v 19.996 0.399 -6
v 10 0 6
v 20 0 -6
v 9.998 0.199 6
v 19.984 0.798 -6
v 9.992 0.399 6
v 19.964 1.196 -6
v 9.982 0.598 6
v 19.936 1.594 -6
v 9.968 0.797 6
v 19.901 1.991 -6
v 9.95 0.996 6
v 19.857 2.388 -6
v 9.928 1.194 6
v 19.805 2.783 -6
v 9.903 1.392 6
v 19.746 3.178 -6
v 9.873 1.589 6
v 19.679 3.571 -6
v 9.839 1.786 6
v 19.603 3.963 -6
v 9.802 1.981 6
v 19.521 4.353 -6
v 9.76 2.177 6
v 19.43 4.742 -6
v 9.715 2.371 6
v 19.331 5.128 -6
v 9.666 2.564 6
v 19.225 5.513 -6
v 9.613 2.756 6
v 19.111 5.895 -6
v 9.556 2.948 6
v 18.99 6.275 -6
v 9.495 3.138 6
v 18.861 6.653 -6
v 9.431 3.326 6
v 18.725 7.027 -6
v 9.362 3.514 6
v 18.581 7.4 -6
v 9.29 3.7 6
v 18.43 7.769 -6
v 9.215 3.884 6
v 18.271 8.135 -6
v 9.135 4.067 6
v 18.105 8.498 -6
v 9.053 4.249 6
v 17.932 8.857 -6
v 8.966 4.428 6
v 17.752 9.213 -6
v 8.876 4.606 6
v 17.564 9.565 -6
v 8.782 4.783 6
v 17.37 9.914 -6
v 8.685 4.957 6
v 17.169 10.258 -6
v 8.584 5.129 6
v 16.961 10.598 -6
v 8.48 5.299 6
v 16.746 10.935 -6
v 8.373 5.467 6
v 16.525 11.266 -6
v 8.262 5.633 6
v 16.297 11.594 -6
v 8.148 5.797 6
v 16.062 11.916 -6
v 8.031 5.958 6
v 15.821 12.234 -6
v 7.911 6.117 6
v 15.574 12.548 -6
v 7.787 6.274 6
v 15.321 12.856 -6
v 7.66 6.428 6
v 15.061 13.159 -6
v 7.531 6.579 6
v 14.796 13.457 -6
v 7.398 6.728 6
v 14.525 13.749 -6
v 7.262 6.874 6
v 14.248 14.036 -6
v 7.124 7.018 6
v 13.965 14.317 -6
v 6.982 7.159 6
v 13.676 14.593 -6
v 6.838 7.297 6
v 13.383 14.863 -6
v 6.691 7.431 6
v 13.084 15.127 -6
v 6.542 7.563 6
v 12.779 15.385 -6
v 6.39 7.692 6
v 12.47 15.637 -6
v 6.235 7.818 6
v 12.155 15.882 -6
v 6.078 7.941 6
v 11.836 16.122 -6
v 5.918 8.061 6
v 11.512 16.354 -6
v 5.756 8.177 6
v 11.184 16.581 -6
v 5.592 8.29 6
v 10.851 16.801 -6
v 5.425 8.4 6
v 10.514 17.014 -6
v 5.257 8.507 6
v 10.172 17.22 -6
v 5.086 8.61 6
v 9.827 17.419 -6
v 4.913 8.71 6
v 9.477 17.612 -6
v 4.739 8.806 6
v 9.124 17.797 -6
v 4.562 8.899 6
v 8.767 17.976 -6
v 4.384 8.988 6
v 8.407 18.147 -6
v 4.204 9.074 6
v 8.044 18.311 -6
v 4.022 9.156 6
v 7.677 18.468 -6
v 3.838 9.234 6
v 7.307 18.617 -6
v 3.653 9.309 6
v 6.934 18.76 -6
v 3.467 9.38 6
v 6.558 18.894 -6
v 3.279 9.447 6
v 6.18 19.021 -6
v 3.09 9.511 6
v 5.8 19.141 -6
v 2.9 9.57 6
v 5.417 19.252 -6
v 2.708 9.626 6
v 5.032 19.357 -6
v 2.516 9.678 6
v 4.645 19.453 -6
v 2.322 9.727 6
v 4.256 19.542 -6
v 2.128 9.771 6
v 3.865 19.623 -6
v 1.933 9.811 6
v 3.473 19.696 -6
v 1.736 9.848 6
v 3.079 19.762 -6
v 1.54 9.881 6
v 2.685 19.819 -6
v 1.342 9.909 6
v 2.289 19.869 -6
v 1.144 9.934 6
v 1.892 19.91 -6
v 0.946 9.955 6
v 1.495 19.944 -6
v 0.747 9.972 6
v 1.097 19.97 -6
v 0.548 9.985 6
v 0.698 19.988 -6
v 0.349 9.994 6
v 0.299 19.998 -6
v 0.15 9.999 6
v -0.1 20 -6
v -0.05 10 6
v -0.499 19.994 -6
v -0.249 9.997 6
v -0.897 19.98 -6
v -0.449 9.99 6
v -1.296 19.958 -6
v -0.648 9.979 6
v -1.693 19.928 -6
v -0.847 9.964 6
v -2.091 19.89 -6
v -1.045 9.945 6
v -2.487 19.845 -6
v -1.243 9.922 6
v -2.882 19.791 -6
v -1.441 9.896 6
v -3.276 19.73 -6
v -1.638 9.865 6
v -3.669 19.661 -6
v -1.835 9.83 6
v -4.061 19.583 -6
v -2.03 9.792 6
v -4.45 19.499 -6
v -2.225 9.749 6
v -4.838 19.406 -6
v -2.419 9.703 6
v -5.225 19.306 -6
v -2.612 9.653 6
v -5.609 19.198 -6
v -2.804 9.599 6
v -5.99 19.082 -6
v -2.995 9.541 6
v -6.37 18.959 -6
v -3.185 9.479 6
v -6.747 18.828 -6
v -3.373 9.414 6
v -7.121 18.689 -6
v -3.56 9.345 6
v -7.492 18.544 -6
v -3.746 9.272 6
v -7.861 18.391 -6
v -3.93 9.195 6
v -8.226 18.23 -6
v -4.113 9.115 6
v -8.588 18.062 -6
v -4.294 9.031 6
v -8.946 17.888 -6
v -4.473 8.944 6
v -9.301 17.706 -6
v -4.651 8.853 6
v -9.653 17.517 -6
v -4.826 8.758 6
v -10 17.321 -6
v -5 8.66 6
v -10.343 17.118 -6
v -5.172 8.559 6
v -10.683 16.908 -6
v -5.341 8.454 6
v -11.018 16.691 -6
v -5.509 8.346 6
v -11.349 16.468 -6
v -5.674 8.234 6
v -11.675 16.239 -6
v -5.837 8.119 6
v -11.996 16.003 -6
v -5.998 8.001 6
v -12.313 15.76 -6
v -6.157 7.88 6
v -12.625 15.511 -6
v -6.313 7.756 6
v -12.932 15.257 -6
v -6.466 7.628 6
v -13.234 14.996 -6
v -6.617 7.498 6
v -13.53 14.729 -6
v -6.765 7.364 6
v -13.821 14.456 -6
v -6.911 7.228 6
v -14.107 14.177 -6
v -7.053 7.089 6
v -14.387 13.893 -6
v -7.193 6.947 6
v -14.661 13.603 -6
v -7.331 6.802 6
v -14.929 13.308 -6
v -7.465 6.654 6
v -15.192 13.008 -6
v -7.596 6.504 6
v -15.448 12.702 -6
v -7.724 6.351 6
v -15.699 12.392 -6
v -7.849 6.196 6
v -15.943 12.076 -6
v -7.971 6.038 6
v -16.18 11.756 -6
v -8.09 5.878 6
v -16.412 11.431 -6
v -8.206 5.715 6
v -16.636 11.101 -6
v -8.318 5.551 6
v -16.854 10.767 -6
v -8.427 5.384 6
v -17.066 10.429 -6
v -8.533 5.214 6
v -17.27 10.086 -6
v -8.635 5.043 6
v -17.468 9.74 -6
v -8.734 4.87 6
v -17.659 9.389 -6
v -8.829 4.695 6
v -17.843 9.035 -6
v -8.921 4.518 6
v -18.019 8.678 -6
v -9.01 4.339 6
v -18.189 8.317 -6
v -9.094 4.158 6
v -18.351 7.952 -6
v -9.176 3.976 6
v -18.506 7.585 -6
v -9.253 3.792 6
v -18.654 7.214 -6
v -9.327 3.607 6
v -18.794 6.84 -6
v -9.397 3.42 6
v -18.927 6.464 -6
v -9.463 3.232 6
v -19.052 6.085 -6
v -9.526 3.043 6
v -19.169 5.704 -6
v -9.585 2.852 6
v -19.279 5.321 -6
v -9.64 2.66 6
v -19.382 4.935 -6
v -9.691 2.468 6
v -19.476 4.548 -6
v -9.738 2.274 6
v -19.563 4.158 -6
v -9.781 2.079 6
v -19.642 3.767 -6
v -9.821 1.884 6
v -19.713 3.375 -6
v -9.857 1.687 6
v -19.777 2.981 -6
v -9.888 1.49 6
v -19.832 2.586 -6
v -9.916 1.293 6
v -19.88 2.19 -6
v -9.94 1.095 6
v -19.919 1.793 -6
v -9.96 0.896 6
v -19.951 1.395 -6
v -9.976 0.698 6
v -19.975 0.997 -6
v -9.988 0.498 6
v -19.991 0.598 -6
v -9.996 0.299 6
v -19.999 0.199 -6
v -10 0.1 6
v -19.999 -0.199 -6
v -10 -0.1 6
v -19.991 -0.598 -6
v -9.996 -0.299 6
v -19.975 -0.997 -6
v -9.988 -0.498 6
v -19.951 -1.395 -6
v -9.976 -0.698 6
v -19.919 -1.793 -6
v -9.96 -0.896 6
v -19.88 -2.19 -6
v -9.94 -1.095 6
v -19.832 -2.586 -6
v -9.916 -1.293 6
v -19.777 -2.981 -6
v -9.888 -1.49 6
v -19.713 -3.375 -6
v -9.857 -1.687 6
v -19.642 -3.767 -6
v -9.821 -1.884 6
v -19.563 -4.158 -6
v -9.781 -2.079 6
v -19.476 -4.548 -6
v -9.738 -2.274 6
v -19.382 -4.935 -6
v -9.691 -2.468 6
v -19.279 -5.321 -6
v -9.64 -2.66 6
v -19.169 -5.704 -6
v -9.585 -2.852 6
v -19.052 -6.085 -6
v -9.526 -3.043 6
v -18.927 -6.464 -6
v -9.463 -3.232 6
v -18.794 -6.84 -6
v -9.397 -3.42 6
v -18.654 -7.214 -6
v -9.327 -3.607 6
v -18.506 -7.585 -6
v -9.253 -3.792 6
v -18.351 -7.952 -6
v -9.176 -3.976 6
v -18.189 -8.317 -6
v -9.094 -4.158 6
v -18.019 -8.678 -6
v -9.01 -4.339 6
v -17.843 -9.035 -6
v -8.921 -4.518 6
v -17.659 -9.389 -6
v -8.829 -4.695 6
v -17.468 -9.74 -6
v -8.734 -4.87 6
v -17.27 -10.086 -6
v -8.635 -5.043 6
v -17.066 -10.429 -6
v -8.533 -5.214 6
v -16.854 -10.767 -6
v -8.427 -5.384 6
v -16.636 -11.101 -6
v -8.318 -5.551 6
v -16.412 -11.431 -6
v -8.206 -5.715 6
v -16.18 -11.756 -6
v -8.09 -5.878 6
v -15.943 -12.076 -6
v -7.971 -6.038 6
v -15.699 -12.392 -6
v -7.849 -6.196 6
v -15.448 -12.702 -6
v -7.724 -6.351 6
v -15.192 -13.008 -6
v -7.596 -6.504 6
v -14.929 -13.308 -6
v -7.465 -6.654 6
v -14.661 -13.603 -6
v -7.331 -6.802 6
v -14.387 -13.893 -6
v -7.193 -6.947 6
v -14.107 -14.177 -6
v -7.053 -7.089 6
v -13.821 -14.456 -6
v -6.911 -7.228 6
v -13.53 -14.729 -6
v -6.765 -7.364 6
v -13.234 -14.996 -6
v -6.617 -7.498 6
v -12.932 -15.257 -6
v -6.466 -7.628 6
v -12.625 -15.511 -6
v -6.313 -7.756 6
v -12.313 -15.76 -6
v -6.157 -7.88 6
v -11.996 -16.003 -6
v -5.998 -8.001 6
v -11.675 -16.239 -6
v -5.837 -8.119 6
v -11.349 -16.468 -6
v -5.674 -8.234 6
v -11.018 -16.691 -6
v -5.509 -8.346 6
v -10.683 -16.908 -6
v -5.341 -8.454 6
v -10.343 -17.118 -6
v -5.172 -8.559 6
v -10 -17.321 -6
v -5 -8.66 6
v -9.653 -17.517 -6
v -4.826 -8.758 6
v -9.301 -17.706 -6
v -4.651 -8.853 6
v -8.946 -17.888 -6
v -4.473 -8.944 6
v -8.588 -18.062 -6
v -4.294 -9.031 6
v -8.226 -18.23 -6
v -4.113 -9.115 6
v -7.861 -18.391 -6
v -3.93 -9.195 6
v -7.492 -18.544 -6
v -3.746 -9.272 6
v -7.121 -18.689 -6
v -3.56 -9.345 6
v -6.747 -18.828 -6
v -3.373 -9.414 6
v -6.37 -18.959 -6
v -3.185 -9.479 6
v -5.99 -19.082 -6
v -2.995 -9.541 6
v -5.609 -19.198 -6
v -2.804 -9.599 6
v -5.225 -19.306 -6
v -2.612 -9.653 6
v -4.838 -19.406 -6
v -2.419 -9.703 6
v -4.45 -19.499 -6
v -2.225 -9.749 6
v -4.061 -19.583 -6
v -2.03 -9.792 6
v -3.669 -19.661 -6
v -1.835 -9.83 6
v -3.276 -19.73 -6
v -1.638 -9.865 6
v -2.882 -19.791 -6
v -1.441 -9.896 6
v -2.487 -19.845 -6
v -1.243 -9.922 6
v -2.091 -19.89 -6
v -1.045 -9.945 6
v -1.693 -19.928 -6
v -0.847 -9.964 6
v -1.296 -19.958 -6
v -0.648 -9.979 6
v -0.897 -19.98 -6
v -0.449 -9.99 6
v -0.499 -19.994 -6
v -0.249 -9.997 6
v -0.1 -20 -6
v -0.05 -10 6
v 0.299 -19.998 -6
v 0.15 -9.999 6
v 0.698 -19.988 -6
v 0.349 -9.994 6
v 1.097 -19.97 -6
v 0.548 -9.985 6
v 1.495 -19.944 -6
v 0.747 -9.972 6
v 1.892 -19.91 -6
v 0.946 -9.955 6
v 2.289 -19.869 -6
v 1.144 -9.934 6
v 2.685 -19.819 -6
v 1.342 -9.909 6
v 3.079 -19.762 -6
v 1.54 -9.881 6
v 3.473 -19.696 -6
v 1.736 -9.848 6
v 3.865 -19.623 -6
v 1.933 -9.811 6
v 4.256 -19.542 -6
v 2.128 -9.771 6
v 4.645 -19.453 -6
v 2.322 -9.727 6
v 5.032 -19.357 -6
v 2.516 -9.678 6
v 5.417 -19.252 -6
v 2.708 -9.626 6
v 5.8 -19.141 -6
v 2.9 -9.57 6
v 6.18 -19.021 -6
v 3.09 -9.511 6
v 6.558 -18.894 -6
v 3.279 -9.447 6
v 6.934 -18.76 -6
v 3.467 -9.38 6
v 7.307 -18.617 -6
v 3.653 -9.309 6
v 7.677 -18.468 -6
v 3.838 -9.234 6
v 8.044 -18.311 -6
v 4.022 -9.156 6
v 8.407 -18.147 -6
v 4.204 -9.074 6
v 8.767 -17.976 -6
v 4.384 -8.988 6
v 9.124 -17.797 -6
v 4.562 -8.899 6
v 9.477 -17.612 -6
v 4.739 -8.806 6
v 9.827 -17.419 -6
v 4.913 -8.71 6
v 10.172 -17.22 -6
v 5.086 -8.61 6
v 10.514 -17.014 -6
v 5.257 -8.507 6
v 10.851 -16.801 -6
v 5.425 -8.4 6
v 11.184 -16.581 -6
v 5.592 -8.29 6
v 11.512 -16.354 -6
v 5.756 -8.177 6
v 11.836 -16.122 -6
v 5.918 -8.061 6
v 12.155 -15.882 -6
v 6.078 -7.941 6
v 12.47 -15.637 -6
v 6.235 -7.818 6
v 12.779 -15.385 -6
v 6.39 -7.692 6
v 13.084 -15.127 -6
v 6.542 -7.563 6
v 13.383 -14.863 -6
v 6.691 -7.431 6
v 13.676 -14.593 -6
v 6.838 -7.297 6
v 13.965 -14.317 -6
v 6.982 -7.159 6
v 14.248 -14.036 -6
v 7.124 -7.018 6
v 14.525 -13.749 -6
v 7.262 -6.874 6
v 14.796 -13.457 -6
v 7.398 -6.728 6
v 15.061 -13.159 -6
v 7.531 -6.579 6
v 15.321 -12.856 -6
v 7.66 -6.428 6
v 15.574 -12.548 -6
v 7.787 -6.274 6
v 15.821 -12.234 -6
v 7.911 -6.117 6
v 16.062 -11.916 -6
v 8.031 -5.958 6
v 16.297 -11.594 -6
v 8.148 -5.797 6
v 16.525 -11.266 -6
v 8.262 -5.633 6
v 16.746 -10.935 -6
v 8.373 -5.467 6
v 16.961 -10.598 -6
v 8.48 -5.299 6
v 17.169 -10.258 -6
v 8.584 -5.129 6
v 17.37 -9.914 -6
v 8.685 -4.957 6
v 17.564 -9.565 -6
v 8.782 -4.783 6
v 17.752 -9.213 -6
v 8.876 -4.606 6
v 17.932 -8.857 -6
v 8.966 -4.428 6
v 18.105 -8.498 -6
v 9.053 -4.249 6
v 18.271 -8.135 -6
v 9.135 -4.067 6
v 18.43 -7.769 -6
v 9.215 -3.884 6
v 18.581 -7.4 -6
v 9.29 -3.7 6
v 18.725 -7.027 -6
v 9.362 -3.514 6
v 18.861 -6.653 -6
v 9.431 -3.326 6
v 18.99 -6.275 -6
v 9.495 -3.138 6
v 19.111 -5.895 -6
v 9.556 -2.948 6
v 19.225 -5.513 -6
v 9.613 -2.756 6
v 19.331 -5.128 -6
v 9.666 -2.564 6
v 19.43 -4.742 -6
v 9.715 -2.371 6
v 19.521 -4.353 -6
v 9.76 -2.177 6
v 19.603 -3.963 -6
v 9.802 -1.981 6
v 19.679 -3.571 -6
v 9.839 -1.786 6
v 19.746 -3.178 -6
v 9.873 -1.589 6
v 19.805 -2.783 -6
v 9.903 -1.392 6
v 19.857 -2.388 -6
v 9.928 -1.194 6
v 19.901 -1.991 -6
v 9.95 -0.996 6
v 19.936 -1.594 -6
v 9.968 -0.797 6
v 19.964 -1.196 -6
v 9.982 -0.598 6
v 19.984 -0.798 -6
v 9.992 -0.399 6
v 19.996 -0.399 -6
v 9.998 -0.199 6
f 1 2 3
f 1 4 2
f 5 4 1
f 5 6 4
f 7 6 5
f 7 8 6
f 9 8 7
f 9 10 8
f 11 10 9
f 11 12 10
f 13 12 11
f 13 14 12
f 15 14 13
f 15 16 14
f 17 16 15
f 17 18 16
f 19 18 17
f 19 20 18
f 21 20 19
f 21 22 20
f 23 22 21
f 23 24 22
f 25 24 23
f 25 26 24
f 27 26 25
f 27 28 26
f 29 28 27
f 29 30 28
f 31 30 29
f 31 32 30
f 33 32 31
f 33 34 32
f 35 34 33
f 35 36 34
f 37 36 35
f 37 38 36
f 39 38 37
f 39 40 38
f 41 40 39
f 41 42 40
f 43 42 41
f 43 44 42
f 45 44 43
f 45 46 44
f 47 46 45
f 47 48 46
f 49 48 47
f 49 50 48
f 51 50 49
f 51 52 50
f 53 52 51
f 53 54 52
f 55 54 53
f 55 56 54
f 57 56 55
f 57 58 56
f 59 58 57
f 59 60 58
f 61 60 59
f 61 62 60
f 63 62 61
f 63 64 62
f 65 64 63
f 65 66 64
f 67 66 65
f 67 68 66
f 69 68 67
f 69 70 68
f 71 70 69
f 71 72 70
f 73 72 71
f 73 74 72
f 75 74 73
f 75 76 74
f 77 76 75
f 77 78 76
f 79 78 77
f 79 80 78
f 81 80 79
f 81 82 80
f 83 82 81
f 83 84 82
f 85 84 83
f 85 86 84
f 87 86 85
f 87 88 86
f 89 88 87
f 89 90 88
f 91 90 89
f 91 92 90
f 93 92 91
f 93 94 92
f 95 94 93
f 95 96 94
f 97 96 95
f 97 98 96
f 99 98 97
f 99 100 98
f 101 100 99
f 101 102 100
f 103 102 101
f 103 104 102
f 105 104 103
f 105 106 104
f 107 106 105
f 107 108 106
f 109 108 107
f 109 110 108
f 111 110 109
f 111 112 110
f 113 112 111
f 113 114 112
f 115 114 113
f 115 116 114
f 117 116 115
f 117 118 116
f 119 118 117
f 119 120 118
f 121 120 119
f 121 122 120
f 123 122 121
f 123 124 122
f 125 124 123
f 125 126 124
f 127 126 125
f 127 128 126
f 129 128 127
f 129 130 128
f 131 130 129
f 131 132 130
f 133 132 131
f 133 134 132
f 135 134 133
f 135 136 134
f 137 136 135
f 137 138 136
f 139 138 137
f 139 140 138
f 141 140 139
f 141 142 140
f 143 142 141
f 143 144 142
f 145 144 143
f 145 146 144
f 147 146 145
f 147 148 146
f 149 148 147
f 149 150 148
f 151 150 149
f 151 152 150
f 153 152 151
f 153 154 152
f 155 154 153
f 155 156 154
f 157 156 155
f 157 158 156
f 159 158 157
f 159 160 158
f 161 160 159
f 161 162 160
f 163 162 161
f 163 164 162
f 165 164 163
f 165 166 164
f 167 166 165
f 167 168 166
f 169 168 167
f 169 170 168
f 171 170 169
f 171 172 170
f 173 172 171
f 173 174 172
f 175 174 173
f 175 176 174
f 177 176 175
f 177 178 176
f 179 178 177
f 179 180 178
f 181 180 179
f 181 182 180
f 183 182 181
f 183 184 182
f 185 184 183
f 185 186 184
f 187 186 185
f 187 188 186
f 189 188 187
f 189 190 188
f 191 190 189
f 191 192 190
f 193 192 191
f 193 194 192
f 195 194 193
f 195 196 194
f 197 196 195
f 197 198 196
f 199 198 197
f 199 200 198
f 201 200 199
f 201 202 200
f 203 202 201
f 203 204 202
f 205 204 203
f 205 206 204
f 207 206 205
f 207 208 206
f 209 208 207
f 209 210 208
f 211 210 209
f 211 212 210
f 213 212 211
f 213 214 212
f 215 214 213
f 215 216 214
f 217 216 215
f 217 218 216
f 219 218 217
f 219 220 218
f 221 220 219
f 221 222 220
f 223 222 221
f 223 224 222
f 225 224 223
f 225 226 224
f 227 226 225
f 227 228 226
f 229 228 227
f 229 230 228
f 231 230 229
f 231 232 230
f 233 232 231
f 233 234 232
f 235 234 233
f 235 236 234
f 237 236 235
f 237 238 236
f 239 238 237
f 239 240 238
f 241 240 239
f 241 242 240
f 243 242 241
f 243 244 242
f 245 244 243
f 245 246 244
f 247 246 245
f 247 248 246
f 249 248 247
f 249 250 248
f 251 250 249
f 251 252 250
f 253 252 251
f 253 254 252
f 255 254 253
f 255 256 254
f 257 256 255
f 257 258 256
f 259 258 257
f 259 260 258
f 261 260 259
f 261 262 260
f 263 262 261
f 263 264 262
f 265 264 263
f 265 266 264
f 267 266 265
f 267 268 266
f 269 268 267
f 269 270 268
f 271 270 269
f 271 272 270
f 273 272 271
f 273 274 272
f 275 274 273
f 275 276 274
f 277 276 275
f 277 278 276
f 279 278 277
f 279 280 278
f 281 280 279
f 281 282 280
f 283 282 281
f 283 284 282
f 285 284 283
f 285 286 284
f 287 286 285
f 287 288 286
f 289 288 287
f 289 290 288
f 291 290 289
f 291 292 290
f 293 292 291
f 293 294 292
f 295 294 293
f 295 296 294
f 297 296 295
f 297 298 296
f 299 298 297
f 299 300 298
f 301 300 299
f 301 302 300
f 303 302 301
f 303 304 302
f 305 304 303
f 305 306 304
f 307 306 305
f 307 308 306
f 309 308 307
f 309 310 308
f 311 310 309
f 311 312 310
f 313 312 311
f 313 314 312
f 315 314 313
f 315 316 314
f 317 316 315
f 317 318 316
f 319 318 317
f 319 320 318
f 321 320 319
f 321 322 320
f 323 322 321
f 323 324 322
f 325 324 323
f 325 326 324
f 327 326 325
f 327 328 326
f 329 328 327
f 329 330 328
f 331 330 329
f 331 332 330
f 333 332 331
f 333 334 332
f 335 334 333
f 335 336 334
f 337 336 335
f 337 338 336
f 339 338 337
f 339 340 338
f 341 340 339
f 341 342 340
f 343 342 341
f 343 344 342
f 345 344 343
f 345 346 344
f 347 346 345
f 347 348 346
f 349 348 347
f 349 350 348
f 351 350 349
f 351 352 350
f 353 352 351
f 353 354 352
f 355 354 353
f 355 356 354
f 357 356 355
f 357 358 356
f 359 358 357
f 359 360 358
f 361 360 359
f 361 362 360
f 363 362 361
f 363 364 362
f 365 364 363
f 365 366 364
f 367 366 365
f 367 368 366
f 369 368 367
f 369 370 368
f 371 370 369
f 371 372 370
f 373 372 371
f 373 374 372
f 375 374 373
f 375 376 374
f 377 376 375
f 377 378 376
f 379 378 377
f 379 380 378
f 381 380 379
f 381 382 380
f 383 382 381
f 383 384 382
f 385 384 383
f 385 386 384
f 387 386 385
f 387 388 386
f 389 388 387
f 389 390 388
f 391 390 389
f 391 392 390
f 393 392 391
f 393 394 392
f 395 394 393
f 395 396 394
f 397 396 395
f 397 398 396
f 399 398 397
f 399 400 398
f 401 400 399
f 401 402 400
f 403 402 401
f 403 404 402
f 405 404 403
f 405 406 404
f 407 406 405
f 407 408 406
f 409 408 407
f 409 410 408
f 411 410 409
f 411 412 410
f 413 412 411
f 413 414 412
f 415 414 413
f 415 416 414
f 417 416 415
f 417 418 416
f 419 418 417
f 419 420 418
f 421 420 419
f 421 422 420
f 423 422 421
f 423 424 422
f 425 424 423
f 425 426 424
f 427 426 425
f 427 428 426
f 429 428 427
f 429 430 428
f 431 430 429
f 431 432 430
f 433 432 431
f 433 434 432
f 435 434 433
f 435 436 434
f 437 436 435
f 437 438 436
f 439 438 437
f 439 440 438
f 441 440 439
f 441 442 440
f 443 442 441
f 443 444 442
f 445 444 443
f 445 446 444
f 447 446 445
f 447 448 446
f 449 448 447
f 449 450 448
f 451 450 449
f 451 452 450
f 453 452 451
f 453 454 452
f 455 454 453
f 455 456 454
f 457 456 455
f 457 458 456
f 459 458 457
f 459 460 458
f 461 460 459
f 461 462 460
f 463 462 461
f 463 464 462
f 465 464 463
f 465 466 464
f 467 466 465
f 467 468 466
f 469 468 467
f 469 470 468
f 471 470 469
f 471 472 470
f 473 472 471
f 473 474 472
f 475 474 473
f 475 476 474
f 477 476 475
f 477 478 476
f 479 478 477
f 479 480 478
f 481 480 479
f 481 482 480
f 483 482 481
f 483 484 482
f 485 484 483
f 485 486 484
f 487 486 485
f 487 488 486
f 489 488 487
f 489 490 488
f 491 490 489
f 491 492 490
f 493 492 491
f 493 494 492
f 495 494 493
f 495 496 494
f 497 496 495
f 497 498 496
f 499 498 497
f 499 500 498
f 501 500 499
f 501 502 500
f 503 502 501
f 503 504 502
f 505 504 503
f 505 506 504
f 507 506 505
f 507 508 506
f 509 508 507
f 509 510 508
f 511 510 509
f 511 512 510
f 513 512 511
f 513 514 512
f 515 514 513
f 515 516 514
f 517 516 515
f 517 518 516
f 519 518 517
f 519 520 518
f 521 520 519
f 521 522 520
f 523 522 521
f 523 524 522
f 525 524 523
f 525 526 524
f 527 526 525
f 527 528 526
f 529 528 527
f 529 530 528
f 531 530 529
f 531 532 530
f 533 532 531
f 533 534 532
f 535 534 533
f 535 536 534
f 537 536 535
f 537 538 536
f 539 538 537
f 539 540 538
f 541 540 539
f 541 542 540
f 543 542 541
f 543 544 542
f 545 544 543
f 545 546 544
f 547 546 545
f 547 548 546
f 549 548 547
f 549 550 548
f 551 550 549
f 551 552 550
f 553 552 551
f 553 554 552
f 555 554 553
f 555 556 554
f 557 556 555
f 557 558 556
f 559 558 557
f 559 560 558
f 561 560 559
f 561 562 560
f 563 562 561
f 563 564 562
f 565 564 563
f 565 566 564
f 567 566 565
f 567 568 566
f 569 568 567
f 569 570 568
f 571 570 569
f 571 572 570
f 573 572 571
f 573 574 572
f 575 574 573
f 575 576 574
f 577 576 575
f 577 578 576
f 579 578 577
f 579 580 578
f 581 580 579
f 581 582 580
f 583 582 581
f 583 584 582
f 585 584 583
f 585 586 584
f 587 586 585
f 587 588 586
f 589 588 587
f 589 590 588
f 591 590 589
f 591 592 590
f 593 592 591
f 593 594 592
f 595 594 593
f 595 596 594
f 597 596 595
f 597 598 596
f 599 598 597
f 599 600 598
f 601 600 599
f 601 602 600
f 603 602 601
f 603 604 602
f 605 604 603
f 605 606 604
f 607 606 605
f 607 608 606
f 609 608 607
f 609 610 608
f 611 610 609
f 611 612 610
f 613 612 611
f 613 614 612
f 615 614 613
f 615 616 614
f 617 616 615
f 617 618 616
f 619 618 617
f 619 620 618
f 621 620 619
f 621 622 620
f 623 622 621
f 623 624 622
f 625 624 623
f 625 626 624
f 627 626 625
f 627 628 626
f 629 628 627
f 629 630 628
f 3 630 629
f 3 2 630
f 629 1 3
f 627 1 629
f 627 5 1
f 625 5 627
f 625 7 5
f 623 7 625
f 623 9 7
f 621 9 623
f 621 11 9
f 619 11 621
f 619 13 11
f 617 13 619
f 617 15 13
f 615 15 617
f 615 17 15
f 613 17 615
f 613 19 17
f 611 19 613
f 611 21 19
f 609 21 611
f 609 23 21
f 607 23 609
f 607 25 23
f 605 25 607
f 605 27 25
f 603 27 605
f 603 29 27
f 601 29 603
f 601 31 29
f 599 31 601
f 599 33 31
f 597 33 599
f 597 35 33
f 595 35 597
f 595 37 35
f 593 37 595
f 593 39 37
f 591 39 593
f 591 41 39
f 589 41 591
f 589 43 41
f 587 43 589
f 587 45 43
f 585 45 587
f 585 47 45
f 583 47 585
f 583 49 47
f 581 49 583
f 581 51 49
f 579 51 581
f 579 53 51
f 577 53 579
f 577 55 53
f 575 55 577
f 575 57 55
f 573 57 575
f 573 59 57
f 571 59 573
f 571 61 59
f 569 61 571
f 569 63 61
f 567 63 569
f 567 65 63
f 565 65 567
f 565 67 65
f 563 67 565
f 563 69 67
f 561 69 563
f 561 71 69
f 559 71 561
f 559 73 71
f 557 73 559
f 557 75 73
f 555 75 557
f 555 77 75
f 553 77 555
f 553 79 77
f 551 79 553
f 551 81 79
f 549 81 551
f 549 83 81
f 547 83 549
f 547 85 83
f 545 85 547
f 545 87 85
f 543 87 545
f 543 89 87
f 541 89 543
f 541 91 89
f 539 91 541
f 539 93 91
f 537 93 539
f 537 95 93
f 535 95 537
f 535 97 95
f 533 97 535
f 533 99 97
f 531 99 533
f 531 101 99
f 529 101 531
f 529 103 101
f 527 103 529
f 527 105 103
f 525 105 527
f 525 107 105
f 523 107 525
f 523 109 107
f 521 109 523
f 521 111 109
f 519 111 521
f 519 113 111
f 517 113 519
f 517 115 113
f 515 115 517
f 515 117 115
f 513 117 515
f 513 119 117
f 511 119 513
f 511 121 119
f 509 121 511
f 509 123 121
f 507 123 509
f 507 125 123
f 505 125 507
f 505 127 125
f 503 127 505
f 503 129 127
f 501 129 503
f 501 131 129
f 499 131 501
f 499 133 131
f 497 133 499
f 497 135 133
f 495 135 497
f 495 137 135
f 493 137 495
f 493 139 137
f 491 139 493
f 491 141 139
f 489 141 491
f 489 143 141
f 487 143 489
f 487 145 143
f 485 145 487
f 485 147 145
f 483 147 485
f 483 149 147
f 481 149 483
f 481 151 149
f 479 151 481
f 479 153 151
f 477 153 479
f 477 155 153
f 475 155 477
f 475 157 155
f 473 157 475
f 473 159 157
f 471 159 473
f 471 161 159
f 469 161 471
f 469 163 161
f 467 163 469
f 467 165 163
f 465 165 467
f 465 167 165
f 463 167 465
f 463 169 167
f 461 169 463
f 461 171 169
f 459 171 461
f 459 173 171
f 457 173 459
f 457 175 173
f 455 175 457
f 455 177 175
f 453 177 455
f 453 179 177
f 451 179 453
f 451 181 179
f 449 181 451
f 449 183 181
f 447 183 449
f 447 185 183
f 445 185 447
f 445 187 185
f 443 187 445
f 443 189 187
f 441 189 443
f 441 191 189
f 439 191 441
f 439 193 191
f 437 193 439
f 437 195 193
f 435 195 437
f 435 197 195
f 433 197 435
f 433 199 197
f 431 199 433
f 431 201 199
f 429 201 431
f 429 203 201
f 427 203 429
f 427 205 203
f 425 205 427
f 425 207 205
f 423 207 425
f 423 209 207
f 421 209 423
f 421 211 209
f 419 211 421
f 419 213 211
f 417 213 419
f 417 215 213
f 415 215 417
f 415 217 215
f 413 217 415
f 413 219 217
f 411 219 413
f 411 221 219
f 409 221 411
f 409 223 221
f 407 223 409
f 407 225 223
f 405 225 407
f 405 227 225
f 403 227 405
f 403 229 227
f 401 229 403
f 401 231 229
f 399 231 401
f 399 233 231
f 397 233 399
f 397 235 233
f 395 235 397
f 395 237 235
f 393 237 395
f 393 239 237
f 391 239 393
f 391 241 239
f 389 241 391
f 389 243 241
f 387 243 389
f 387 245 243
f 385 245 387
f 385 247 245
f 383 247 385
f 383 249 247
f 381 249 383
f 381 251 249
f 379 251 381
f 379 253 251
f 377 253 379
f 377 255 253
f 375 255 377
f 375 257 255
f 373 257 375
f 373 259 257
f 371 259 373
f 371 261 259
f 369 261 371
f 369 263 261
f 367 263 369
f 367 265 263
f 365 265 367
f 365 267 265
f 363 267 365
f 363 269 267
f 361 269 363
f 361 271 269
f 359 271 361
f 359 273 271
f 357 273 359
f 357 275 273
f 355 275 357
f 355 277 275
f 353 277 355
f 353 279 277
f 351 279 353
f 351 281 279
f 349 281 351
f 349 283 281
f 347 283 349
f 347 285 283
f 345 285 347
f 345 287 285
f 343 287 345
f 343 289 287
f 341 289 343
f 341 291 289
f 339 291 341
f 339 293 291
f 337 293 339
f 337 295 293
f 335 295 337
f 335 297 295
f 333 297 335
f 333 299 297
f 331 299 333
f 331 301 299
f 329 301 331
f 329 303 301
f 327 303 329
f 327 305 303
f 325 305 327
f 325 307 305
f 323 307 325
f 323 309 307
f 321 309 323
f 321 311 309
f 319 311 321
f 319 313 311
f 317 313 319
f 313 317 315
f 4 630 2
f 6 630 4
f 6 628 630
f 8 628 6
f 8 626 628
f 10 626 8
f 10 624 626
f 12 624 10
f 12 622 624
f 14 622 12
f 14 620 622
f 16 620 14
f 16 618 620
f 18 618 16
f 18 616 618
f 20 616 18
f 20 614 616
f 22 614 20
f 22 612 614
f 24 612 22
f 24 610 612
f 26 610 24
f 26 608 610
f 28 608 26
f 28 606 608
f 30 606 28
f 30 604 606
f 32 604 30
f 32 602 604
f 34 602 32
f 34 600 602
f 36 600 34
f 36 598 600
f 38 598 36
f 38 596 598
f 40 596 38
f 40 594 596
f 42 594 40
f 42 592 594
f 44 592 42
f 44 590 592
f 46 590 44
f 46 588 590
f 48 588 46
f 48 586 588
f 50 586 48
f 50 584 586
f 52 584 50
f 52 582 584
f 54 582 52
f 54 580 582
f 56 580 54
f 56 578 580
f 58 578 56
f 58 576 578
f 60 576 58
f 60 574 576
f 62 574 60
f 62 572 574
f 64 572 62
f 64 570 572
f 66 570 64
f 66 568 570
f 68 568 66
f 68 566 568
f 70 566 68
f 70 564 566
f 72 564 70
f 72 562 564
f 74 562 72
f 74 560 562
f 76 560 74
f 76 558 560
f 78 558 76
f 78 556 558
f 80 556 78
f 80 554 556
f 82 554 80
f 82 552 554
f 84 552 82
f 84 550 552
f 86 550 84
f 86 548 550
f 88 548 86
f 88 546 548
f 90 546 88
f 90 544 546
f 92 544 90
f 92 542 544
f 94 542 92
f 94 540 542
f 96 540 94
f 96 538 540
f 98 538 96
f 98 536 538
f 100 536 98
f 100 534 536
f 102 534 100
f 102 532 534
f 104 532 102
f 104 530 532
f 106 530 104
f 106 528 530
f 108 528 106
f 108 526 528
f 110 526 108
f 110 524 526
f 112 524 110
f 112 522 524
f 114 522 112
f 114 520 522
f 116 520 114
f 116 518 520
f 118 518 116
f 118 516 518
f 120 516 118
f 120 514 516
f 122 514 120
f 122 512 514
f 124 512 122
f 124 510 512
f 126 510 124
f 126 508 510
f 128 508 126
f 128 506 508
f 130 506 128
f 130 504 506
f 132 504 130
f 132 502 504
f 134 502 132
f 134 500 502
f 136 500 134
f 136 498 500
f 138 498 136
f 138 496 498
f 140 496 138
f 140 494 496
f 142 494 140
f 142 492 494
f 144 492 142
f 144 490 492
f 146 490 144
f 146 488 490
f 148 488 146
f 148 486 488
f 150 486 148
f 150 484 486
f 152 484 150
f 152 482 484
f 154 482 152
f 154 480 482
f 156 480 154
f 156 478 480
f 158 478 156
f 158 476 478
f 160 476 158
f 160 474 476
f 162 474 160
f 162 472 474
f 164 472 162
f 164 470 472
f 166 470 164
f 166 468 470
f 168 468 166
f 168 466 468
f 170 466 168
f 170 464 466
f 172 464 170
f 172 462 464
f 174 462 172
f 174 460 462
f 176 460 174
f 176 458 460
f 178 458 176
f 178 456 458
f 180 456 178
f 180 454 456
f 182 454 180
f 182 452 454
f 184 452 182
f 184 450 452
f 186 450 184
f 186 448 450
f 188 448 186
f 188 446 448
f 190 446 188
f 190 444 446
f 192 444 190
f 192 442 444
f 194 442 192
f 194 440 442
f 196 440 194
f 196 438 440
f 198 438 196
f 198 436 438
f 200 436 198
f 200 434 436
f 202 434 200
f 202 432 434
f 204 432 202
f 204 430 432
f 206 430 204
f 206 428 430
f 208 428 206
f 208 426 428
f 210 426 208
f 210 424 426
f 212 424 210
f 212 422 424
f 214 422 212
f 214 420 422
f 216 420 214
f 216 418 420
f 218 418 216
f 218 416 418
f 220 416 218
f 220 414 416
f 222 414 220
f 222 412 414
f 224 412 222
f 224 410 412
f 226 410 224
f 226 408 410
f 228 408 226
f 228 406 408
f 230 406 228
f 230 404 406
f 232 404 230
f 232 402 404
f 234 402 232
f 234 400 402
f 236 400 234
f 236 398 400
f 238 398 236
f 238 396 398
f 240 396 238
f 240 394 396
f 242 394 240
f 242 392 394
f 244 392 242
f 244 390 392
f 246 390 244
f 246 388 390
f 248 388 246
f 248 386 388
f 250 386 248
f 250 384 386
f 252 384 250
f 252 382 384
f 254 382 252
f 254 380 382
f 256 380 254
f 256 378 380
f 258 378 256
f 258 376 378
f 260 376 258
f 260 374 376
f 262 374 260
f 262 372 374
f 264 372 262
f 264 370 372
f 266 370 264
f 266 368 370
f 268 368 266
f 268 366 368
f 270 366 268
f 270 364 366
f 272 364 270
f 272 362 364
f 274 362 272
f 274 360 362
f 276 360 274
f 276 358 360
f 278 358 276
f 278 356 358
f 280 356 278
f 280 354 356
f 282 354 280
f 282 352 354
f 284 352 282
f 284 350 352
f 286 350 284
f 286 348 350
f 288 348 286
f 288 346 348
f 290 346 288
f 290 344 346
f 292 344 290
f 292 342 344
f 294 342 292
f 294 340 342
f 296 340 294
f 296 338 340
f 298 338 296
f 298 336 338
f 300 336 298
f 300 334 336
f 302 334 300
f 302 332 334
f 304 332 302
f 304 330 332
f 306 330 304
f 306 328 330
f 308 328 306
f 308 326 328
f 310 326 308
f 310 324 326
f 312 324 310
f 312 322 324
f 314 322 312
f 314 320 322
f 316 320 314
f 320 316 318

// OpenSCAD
/*
1.- Establece el ángulo mínimo (en grados) para un fragmento 
    de un círculo o arco. Esto afecta la suavidad de las superficies curvas.
2.- Establece el tamaño mínimo de un fragmento. Esto también afecta 
    la suavidad de las superficies curvas.
*/
$fa = 1;    
$fs = 0.4;

cylinder(h=12, r=20, r2=10, center=true);
